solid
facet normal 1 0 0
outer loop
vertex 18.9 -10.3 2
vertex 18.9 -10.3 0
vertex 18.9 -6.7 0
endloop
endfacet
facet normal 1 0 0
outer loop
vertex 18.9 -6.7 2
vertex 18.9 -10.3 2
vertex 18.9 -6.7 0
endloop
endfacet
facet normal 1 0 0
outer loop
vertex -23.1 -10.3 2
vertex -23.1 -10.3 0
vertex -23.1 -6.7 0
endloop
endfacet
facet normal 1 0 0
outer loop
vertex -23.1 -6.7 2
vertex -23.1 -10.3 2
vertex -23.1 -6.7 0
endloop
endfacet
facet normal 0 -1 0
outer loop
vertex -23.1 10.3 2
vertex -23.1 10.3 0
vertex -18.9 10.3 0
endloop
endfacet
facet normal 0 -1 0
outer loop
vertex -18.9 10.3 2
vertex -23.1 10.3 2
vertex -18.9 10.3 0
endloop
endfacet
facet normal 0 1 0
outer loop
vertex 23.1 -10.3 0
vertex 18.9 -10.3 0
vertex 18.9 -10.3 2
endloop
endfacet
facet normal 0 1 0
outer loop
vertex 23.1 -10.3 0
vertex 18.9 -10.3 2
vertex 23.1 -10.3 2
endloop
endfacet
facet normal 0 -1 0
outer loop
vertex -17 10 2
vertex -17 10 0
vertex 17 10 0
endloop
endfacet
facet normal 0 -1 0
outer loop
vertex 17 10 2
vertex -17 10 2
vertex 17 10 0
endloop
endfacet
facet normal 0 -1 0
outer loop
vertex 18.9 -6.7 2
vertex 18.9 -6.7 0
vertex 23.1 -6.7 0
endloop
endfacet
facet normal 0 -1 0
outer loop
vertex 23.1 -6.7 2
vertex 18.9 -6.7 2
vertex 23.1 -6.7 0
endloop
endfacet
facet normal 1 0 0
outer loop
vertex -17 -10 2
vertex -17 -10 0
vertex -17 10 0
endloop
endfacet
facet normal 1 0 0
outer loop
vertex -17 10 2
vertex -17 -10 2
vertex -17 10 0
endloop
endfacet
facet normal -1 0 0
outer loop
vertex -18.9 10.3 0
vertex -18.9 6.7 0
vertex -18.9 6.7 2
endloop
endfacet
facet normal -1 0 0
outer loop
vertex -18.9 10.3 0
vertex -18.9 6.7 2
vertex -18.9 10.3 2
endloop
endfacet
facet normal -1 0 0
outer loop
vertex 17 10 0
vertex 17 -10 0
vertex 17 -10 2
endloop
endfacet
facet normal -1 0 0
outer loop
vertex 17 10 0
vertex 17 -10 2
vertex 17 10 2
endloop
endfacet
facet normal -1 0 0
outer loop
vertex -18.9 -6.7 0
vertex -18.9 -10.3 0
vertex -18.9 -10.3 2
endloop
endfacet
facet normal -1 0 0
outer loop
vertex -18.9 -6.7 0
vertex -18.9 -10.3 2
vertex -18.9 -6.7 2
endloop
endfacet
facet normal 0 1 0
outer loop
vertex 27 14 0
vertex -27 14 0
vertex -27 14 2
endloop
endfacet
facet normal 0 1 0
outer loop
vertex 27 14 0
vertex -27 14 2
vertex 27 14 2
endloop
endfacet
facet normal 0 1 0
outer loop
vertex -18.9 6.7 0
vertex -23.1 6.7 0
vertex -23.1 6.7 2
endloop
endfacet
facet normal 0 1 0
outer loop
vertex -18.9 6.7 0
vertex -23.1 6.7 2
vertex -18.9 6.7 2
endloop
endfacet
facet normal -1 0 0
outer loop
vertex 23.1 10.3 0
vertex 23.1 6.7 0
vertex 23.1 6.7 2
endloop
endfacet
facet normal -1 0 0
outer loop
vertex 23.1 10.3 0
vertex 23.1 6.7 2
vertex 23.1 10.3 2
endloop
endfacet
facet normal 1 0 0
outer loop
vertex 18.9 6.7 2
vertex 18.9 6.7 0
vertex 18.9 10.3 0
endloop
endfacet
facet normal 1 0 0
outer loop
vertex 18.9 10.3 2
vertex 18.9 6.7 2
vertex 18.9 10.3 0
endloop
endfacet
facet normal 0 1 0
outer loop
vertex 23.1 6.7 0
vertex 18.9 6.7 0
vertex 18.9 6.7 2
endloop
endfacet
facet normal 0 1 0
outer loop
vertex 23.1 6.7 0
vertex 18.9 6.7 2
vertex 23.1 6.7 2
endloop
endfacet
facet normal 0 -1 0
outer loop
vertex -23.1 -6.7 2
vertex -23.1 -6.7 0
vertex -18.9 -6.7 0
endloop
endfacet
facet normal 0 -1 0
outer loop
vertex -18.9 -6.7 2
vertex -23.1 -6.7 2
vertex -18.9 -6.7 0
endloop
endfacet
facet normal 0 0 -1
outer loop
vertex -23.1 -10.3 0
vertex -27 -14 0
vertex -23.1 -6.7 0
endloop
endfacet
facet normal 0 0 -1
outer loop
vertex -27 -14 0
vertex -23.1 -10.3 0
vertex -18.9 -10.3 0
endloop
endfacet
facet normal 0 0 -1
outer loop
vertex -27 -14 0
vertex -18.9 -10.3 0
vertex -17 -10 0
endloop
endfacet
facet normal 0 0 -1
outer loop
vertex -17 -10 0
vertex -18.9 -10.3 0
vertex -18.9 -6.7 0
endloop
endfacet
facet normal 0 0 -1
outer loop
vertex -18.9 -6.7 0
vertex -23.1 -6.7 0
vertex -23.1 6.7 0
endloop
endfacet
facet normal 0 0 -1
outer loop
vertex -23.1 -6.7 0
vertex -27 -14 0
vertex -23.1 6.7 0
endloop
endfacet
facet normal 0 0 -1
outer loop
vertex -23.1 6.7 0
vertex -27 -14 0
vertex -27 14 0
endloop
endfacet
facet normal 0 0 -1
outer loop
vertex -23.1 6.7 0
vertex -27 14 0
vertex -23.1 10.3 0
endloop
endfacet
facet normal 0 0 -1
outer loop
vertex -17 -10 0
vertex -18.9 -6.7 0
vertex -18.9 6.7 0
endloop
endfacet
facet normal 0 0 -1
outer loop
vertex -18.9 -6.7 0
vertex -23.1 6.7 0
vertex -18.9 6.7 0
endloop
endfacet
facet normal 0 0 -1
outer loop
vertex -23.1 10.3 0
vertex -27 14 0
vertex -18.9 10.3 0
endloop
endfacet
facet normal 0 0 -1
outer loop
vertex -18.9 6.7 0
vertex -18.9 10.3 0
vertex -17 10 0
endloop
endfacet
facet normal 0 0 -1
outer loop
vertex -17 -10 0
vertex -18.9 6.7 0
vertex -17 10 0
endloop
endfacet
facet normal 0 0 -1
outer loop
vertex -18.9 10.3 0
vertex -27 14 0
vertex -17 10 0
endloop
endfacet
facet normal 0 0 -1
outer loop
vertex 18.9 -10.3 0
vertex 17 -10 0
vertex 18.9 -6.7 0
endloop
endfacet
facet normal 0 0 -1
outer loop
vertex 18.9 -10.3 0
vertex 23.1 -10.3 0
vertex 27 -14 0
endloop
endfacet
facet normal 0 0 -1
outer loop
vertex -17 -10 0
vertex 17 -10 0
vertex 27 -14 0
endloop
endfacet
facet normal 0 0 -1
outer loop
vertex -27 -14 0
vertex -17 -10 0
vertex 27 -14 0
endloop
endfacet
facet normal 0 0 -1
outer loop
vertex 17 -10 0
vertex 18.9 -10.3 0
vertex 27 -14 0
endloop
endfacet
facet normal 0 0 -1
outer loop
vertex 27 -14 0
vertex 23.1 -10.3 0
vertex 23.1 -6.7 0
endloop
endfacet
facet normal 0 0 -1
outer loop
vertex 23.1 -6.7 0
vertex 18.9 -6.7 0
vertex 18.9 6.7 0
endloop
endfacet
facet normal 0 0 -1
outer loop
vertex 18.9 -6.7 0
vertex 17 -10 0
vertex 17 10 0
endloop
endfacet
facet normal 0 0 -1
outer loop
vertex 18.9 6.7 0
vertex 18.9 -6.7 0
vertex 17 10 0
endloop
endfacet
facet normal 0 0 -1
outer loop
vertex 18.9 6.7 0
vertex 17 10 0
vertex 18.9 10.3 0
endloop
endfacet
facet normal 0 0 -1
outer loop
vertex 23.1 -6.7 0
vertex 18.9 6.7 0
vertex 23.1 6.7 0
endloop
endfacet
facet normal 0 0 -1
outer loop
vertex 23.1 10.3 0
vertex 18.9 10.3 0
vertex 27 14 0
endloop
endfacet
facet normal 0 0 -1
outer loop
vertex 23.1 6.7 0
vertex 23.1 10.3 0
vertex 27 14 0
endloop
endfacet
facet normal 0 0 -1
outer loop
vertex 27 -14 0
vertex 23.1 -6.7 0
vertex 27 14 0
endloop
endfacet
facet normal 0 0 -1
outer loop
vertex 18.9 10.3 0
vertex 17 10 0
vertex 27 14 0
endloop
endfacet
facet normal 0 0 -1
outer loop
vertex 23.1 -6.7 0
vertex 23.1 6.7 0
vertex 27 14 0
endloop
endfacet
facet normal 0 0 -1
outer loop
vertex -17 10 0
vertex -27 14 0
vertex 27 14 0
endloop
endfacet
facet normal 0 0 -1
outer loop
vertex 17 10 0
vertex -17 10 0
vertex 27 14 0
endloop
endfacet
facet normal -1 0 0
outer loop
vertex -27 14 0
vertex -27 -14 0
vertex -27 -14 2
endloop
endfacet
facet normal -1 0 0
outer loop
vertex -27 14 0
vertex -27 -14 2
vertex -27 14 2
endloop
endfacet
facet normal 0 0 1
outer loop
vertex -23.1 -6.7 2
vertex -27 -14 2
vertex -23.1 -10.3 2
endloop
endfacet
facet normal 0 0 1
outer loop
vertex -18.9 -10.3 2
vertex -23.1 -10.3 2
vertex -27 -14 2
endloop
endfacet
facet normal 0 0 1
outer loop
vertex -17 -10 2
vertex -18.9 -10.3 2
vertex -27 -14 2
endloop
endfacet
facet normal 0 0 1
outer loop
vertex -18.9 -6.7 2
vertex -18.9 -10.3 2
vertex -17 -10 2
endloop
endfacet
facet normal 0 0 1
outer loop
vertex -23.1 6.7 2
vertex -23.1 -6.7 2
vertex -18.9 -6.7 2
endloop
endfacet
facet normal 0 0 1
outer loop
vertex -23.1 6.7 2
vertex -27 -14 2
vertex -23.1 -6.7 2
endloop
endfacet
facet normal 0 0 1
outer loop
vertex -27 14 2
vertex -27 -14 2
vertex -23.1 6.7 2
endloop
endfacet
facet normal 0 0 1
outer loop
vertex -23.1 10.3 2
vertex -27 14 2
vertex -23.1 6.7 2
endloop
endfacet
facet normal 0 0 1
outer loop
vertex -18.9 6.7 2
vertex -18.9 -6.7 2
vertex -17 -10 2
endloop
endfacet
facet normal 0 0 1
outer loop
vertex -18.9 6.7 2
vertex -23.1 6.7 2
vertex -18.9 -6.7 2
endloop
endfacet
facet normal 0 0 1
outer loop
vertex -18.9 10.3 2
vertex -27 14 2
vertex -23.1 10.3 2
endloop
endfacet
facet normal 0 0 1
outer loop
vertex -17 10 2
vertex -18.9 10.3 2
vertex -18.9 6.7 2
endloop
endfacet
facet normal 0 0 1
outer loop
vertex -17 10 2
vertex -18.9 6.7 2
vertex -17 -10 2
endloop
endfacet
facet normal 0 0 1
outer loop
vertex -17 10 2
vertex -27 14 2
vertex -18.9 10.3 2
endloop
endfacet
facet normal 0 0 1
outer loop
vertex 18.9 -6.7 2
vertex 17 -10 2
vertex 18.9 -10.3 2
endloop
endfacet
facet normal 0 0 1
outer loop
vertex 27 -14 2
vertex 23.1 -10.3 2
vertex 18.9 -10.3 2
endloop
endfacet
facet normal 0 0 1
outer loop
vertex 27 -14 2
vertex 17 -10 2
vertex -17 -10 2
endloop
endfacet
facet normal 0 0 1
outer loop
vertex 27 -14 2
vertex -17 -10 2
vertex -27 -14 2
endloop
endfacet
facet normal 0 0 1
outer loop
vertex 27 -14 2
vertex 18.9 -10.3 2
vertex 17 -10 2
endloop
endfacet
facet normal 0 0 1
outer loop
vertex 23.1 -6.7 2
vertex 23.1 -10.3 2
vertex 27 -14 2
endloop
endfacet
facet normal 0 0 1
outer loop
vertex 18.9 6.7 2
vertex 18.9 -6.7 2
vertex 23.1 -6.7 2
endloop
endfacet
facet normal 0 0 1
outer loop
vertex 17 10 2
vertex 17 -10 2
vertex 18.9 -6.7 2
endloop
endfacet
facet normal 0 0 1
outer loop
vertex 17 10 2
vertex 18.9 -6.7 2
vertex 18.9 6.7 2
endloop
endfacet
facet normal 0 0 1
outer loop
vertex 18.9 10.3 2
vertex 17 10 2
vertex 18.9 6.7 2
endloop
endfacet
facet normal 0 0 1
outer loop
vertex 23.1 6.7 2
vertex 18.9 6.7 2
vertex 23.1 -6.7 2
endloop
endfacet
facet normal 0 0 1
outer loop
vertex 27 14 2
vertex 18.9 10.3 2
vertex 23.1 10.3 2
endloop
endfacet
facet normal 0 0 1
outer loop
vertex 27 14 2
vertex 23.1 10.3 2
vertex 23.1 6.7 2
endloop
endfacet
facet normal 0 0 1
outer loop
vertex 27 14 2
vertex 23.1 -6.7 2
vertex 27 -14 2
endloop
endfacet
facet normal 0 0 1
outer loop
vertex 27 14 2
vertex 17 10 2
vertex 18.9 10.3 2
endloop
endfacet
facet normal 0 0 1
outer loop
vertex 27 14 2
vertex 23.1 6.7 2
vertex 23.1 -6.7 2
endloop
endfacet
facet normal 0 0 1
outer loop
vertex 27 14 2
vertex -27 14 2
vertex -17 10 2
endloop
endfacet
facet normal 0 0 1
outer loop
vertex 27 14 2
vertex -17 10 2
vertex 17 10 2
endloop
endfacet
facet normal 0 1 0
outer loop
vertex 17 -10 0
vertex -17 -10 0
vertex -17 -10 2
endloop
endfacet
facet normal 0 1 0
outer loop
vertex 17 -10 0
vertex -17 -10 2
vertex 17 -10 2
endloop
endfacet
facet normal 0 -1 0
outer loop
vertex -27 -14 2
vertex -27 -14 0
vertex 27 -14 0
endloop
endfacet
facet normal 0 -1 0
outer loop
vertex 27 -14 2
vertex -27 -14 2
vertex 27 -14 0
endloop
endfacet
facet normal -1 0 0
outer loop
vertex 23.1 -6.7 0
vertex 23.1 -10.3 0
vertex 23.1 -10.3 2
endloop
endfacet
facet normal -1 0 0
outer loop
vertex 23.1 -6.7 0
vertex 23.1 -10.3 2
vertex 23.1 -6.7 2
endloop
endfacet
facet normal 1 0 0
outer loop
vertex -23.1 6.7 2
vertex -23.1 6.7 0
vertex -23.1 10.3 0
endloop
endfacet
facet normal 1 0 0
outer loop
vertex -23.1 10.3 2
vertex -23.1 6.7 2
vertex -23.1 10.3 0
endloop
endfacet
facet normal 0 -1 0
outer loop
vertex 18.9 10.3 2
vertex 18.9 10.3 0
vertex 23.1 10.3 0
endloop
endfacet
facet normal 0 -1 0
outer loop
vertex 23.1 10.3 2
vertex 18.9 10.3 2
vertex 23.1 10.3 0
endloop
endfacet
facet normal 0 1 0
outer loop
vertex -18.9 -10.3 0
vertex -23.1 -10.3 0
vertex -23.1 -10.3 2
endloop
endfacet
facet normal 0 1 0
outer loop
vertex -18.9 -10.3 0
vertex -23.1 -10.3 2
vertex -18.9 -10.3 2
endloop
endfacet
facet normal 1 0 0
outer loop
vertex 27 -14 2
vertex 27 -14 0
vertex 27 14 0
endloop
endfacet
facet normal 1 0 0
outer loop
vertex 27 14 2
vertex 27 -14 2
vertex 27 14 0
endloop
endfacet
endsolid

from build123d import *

# Parameters (mm, degrees)
SKETCH_1_W                               = 54
SKETCH_1_H                               = 28
GAUGE_PLATE_2MM_DEPTH                    = 2
OPEN_WINDOW_START                        = -0.1
SKETCH_2_W                               = 34
SKETCH_2_H                               = 20
OPEN_WINDOW_DEPTH                        = 2.2
SAME_SLOTS_AS_SENSOR_BRACKET_42X17_START = -0.1
SKETCH_3_W                               = 4.2
SKETCH_3_H                               = 3.6
SAME_SLOTS_AS_SENSOR_BRACKET_42X17_DEPTH = 2.2


with BuildPart() as part:
    # 草图1 → Gauge_plate_2mm (new body)
    with BuildSketch(Plane.XY):
        Rectangle(SKETCH_1_W, SKETCH_1_H)
    extrude(amount=GAUGE_PLATE_2MM_DEPTH)

    # 草图2 → Open_window (cut)
    with BuildSketch(Plane.XY.offset(OPEN_WINDOW_START)):
        Rectangle(SKETCH_2_W, SKETCH_2_H)
    extrude(amount=OPEN_WINDOW_DEPTH, mode=Mode.SUBTRACT)

    # 草图3 → Same_slots_as_sensor_bracket_42x17 (cut)
    with BuildSketch(Plane.XY.offset(SAME_SLOTS_AS_SENSOR_BRACKET_42X17_START)):
        with Locations((-21, -8.5)):
            Rectangle(SKETCH_3_W, SKETCH_3_H)
        with Locations((-21, 8.5)):
            Rectangle(SKETCH_3_W, SKETCH_3_H)
        with Locations((21, -8.5)):
            Rectangle(SKETCH_3_W, SKETCH_3_H)
        with Locations((21, 8.5)):
            Rectangle(SKETCH_3_W, SKETCH_3_H)
    extrude(amount=SAME_SLOTS_AS_SENSOR_BRACKET_42X17_DEPTH, mode=Mode.SUBTRACT)


solid = part.part
